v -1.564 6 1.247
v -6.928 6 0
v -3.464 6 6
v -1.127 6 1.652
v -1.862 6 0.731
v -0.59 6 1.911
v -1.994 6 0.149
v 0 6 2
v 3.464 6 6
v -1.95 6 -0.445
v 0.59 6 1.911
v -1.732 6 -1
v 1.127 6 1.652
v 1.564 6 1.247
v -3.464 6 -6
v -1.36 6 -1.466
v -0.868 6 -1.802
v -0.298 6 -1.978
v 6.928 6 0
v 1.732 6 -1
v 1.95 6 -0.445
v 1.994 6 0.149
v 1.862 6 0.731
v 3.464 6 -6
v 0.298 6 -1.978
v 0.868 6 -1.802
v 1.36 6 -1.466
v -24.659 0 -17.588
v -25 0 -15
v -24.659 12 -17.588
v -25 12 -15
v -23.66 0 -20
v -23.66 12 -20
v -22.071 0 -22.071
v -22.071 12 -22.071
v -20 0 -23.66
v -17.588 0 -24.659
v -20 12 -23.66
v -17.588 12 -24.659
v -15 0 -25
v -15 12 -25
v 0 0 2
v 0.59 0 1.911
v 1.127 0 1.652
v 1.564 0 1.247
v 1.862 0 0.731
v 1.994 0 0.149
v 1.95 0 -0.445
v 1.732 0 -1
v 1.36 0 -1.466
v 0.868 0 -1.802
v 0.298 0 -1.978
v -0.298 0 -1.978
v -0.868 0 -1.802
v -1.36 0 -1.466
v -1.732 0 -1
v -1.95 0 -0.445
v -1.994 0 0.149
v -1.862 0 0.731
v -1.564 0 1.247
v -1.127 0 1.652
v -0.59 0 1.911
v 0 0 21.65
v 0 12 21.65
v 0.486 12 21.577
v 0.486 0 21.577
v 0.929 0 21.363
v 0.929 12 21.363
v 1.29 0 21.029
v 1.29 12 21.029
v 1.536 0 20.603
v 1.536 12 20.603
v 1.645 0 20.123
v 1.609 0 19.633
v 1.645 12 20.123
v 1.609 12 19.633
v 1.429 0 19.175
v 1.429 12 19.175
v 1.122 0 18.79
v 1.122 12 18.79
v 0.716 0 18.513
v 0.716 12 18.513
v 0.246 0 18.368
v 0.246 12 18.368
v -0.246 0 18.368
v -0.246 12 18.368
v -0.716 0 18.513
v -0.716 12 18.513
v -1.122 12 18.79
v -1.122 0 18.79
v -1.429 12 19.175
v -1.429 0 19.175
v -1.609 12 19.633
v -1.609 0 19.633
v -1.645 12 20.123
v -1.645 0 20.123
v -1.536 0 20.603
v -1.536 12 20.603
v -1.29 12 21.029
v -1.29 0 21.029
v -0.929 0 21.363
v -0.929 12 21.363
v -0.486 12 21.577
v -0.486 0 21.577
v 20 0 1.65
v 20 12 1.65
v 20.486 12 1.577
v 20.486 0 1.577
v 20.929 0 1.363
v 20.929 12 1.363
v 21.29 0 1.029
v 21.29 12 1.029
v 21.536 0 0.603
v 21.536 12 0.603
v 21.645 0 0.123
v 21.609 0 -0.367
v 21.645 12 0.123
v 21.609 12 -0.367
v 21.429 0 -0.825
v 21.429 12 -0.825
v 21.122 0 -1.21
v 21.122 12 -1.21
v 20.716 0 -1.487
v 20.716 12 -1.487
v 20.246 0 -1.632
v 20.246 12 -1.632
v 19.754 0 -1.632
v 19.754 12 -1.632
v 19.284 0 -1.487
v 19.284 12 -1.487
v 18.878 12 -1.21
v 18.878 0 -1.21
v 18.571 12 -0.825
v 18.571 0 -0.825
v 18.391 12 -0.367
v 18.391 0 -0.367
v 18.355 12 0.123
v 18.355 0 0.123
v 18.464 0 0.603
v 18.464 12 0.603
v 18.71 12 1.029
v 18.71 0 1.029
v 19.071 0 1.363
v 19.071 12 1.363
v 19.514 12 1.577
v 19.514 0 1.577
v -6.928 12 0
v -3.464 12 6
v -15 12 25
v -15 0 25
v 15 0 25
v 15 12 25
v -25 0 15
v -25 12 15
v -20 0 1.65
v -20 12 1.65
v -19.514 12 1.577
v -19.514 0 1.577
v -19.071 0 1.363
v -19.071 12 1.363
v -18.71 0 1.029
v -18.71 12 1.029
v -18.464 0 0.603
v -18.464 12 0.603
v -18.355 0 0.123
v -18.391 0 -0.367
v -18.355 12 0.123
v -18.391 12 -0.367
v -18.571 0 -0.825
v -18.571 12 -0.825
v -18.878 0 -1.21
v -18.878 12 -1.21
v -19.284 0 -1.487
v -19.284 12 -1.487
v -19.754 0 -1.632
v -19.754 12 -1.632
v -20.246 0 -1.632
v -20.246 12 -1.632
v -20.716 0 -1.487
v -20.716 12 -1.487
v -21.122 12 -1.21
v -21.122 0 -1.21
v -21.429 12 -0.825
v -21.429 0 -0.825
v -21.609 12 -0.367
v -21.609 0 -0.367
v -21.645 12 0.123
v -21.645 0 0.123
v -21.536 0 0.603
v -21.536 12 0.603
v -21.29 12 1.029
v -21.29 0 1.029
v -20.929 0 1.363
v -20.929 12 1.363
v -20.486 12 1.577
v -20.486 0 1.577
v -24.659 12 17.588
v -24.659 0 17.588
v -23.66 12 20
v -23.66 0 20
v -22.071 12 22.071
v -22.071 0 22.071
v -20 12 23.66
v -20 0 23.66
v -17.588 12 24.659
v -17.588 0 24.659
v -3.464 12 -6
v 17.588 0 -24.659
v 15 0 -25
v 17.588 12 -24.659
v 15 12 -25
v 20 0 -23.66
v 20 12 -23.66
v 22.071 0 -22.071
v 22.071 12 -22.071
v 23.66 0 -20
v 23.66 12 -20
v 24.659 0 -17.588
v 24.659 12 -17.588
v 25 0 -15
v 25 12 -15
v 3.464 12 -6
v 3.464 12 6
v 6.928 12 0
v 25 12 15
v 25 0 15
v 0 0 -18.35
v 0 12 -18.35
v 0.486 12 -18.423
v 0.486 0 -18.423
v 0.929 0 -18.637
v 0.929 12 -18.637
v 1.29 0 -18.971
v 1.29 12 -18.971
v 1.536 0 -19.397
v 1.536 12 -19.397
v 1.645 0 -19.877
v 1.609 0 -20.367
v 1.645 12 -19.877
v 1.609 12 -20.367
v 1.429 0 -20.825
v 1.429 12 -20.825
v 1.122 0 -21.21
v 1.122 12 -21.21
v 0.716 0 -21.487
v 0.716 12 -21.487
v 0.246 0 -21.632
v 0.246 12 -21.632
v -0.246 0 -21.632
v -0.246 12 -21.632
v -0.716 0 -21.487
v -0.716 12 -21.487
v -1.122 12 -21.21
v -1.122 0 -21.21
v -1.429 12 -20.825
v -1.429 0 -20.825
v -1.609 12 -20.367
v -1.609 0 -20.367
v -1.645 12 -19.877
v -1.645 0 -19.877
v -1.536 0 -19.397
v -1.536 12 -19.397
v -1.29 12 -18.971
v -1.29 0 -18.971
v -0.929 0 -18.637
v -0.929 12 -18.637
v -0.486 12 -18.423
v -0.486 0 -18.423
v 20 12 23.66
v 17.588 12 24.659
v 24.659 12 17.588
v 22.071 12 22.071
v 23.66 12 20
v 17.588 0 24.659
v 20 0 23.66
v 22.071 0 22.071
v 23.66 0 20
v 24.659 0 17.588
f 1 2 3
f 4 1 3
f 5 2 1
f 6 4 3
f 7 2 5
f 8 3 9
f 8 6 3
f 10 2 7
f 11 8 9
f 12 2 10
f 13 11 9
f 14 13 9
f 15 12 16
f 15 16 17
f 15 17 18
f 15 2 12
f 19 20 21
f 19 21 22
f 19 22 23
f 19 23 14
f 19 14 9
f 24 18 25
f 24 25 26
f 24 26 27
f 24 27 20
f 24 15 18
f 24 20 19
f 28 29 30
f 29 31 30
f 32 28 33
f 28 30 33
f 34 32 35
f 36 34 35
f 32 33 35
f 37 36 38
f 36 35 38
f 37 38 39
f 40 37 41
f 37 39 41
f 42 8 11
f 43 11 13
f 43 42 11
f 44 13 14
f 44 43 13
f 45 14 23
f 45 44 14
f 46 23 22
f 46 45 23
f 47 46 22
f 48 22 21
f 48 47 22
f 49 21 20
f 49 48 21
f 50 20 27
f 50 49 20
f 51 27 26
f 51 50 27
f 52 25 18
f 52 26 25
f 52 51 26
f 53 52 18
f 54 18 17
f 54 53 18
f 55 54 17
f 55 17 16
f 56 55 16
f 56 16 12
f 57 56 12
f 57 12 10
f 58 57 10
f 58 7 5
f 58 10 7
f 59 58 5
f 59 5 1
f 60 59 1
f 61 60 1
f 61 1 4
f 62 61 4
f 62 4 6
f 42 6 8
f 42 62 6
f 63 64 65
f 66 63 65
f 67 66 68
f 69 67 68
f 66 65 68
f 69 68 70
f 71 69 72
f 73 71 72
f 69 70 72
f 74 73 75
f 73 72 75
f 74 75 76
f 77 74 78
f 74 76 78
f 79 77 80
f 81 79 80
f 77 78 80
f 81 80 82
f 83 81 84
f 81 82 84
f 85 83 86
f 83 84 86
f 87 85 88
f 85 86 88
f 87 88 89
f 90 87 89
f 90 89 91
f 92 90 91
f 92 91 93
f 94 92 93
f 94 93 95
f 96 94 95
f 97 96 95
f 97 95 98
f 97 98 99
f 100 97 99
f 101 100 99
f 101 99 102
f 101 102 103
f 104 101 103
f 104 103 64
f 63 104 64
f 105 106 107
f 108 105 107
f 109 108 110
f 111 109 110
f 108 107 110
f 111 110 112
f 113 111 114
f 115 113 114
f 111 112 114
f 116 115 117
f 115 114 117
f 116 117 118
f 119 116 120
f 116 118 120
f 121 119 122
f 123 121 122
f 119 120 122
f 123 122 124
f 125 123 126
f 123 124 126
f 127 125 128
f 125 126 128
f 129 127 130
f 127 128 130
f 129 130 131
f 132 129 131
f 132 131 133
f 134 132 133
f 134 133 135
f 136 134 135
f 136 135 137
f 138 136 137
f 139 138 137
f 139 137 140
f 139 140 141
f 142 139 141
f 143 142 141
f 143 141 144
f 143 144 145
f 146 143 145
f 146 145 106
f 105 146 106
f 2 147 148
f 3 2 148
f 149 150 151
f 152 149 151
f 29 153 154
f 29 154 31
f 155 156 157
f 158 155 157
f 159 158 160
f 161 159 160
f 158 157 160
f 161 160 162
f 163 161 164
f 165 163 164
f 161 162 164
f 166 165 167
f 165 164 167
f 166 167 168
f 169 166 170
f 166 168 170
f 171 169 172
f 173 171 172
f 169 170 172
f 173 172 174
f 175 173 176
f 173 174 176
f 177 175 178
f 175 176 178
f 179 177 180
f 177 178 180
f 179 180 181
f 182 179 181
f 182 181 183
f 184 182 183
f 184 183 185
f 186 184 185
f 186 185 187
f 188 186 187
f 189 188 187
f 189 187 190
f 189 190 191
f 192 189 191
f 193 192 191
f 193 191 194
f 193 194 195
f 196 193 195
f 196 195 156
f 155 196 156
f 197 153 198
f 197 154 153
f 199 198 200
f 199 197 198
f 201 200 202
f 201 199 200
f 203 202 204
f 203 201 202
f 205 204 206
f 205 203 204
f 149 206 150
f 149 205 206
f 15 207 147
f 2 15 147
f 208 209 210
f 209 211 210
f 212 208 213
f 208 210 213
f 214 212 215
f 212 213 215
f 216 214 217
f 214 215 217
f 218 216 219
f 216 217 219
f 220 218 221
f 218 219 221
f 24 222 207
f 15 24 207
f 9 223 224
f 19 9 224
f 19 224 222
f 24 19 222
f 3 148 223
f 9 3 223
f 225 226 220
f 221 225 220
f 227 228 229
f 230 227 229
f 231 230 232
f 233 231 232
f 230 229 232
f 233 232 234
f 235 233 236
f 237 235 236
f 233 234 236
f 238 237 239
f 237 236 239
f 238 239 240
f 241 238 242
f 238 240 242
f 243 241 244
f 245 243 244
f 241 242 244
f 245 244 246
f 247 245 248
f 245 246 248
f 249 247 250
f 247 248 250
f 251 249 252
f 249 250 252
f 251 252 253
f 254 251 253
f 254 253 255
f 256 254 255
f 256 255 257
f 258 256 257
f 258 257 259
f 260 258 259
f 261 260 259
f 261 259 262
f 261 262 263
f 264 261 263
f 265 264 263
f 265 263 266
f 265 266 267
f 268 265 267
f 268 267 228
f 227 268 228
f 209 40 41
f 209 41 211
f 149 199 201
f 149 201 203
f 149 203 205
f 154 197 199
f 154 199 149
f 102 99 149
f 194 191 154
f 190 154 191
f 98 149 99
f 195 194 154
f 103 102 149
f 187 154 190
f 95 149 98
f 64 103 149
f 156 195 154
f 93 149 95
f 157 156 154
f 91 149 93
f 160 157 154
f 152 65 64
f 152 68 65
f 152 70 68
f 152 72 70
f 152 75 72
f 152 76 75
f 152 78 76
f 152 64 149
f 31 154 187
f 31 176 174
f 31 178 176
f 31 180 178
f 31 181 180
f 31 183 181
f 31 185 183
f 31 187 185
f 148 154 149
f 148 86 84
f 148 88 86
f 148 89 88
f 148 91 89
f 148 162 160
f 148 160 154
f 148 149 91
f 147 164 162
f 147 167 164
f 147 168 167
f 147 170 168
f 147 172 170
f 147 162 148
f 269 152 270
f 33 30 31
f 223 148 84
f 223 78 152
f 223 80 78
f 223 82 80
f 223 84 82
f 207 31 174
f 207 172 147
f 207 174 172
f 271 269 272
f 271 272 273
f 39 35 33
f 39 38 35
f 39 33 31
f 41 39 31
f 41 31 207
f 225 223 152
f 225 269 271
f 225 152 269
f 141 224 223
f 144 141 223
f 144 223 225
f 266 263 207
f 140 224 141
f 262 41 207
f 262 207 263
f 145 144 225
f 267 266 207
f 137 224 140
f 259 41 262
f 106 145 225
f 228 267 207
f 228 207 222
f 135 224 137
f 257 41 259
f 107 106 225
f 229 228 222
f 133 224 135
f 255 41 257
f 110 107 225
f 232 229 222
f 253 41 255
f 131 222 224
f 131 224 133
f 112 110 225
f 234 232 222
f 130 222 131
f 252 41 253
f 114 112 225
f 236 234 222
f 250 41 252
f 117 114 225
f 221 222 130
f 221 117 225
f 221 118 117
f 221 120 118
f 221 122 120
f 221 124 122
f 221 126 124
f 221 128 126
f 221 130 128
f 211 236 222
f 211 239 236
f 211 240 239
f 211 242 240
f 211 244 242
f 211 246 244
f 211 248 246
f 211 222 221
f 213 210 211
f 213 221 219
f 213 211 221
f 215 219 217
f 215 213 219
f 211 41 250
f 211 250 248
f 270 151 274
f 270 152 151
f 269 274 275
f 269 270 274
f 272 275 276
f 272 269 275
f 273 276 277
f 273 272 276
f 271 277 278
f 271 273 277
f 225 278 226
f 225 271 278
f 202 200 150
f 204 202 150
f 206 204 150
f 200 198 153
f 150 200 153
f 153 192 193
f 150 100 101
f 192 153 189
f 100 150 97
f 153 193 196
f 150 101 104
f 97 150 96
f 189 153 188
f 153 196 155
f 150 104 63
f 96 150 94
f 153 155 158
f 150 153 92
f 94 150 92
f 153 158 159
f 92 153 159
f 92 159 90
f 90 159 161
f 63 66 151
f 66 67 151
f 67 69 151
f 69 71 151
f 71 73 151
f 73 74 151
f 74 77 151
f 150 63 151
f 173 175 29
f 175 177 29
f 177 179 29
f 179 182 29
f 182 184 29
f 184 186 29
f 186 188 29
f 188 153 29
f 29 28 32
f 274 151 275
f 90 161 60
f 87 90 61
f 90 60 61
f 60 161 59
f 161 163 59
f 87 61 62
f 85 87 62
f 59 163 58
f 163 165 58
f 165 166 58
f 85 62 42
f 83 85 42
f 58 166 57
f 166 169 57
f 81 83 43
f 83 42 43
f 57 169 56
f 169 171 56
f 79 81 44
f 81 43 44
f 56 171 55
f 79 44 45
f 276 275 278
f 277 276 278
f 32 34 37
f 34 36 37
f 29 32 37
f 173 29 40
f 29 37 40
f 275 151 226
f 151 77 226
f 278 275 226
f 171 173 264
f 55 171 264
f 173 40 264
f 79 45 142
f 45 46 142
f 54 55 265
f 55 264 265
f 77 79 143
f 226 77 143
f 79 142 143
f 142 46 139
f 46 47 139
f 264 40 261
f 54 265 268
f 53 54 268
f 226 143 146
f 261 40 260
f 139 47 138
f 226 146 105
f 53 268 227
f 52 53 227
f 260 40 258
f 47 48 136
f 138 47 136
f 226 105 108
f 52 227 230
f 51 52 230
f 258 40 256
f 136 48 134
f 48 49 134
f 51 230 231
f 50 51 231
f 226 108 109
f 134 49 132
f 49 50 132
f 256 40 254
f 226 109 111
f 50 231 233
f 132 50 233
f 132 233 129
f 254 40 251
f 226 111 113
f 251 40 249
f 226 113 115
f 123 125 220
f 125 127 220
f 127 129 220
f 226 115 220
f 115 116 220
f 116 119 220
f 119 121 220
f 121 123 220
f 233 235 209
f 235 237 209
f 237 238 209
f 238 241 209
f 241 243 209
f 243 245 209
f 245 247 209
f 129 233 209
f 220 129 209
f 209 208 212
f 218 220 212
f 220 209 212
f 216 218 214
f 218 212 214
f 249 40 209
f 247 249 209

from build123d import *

# Parameters (mm, degrees)
SKETCH1_W           = 50
SKETCH1_H           = 50
BOSS_EXTRUDE1_DEPTH = 12
CUT_EXTRUDE1_DEPTH  = 6
SKETCH4_R           = 1.65
CUT_EXTRUDE2_DEPTH  = 25
FILLET1_R           = 10
SKETCH5_R           = 2
CUT_EXTRUDE4_DEPTH  = 10


with BuildPart() as part:
    # Sketch1 → Boss-Extrude1 (new body)
    with BuildSketch(Plane(origin=(0, 0, 0), x_dir=(1, 0, 0), z_dir=(0, 1, 0))):
        Rectangle(SKETCH1_W, SKETCH1_H)
    extrude(amount=BOSS_EXTRUDE1_DEPTH)

    # Sketch2 → Cut-Extrude1 (cut)
    with BuildSketch(Plane(origin=(0, 12, 0), x_dir=(1, 0, 0), z_dir=(0, 1, 0))):
        Polygon((6.92820323, 0), (3.464101615, 6), (-3.464101615, 6), (-6.92820323, 0), (-3.464101615, -6), (3.464101615, -6), align=None)
    extrude(amount=-CUT_EXTRUDE1_DEPTH, mode=Mode.SUBTRACT)

    # Sketch4 → Cut-Extrude2 (cut)
    with BuildSketch(Plane(origin=(0, 12, 0), x_dir=(1, 0, 0), z_dir=(0, 1, 0))):
        with Locations(Location((0, 20, 0), (0, 0, 270))):
            Circle(SKETCH4_R)
        with Locations(Location((20, 0, 0), (0, 0, 270))):
            Circle(SKETCH4_R)
        with Locations(Location((-20, 0, 0), (0, 0, 270))):
            Circle(SKETCH4_R)
        with Locations(Location((0, -20, 0), (0, 0, 270))):
            Circle(SKETCH4_R)
    extrude(amount=-CUT_EXTRUDE2_DEPTH, mode=Mode.SUBTRACT)

    # Fillet1
    fillet1_edges = [part.edges().sort_by_distance(p)[0] for p in [
        (25, 6, 25),
        (-25, 6, 25),
        (-25, 6, -25),
        (25, 6, -25),
    ]]
    fillet(fillet1_edges, radius=FILLET1_R)

    # Sketch5 → Cut-Extrude4 (cut)
    with BuildSketch(Plane(origin=(0, 0, 0), x_dir=(1, 0, 0), z_dir=(0, 1, 0))):
        with Locations(Location((0, 0, 0), (0, 0, 270))):
            Circle(SKETCH5_R)
    extrude(amount=CUT_EXTRUDE4_DEPTH, mode=Mode.SUBTRACT)


solid = part.part
